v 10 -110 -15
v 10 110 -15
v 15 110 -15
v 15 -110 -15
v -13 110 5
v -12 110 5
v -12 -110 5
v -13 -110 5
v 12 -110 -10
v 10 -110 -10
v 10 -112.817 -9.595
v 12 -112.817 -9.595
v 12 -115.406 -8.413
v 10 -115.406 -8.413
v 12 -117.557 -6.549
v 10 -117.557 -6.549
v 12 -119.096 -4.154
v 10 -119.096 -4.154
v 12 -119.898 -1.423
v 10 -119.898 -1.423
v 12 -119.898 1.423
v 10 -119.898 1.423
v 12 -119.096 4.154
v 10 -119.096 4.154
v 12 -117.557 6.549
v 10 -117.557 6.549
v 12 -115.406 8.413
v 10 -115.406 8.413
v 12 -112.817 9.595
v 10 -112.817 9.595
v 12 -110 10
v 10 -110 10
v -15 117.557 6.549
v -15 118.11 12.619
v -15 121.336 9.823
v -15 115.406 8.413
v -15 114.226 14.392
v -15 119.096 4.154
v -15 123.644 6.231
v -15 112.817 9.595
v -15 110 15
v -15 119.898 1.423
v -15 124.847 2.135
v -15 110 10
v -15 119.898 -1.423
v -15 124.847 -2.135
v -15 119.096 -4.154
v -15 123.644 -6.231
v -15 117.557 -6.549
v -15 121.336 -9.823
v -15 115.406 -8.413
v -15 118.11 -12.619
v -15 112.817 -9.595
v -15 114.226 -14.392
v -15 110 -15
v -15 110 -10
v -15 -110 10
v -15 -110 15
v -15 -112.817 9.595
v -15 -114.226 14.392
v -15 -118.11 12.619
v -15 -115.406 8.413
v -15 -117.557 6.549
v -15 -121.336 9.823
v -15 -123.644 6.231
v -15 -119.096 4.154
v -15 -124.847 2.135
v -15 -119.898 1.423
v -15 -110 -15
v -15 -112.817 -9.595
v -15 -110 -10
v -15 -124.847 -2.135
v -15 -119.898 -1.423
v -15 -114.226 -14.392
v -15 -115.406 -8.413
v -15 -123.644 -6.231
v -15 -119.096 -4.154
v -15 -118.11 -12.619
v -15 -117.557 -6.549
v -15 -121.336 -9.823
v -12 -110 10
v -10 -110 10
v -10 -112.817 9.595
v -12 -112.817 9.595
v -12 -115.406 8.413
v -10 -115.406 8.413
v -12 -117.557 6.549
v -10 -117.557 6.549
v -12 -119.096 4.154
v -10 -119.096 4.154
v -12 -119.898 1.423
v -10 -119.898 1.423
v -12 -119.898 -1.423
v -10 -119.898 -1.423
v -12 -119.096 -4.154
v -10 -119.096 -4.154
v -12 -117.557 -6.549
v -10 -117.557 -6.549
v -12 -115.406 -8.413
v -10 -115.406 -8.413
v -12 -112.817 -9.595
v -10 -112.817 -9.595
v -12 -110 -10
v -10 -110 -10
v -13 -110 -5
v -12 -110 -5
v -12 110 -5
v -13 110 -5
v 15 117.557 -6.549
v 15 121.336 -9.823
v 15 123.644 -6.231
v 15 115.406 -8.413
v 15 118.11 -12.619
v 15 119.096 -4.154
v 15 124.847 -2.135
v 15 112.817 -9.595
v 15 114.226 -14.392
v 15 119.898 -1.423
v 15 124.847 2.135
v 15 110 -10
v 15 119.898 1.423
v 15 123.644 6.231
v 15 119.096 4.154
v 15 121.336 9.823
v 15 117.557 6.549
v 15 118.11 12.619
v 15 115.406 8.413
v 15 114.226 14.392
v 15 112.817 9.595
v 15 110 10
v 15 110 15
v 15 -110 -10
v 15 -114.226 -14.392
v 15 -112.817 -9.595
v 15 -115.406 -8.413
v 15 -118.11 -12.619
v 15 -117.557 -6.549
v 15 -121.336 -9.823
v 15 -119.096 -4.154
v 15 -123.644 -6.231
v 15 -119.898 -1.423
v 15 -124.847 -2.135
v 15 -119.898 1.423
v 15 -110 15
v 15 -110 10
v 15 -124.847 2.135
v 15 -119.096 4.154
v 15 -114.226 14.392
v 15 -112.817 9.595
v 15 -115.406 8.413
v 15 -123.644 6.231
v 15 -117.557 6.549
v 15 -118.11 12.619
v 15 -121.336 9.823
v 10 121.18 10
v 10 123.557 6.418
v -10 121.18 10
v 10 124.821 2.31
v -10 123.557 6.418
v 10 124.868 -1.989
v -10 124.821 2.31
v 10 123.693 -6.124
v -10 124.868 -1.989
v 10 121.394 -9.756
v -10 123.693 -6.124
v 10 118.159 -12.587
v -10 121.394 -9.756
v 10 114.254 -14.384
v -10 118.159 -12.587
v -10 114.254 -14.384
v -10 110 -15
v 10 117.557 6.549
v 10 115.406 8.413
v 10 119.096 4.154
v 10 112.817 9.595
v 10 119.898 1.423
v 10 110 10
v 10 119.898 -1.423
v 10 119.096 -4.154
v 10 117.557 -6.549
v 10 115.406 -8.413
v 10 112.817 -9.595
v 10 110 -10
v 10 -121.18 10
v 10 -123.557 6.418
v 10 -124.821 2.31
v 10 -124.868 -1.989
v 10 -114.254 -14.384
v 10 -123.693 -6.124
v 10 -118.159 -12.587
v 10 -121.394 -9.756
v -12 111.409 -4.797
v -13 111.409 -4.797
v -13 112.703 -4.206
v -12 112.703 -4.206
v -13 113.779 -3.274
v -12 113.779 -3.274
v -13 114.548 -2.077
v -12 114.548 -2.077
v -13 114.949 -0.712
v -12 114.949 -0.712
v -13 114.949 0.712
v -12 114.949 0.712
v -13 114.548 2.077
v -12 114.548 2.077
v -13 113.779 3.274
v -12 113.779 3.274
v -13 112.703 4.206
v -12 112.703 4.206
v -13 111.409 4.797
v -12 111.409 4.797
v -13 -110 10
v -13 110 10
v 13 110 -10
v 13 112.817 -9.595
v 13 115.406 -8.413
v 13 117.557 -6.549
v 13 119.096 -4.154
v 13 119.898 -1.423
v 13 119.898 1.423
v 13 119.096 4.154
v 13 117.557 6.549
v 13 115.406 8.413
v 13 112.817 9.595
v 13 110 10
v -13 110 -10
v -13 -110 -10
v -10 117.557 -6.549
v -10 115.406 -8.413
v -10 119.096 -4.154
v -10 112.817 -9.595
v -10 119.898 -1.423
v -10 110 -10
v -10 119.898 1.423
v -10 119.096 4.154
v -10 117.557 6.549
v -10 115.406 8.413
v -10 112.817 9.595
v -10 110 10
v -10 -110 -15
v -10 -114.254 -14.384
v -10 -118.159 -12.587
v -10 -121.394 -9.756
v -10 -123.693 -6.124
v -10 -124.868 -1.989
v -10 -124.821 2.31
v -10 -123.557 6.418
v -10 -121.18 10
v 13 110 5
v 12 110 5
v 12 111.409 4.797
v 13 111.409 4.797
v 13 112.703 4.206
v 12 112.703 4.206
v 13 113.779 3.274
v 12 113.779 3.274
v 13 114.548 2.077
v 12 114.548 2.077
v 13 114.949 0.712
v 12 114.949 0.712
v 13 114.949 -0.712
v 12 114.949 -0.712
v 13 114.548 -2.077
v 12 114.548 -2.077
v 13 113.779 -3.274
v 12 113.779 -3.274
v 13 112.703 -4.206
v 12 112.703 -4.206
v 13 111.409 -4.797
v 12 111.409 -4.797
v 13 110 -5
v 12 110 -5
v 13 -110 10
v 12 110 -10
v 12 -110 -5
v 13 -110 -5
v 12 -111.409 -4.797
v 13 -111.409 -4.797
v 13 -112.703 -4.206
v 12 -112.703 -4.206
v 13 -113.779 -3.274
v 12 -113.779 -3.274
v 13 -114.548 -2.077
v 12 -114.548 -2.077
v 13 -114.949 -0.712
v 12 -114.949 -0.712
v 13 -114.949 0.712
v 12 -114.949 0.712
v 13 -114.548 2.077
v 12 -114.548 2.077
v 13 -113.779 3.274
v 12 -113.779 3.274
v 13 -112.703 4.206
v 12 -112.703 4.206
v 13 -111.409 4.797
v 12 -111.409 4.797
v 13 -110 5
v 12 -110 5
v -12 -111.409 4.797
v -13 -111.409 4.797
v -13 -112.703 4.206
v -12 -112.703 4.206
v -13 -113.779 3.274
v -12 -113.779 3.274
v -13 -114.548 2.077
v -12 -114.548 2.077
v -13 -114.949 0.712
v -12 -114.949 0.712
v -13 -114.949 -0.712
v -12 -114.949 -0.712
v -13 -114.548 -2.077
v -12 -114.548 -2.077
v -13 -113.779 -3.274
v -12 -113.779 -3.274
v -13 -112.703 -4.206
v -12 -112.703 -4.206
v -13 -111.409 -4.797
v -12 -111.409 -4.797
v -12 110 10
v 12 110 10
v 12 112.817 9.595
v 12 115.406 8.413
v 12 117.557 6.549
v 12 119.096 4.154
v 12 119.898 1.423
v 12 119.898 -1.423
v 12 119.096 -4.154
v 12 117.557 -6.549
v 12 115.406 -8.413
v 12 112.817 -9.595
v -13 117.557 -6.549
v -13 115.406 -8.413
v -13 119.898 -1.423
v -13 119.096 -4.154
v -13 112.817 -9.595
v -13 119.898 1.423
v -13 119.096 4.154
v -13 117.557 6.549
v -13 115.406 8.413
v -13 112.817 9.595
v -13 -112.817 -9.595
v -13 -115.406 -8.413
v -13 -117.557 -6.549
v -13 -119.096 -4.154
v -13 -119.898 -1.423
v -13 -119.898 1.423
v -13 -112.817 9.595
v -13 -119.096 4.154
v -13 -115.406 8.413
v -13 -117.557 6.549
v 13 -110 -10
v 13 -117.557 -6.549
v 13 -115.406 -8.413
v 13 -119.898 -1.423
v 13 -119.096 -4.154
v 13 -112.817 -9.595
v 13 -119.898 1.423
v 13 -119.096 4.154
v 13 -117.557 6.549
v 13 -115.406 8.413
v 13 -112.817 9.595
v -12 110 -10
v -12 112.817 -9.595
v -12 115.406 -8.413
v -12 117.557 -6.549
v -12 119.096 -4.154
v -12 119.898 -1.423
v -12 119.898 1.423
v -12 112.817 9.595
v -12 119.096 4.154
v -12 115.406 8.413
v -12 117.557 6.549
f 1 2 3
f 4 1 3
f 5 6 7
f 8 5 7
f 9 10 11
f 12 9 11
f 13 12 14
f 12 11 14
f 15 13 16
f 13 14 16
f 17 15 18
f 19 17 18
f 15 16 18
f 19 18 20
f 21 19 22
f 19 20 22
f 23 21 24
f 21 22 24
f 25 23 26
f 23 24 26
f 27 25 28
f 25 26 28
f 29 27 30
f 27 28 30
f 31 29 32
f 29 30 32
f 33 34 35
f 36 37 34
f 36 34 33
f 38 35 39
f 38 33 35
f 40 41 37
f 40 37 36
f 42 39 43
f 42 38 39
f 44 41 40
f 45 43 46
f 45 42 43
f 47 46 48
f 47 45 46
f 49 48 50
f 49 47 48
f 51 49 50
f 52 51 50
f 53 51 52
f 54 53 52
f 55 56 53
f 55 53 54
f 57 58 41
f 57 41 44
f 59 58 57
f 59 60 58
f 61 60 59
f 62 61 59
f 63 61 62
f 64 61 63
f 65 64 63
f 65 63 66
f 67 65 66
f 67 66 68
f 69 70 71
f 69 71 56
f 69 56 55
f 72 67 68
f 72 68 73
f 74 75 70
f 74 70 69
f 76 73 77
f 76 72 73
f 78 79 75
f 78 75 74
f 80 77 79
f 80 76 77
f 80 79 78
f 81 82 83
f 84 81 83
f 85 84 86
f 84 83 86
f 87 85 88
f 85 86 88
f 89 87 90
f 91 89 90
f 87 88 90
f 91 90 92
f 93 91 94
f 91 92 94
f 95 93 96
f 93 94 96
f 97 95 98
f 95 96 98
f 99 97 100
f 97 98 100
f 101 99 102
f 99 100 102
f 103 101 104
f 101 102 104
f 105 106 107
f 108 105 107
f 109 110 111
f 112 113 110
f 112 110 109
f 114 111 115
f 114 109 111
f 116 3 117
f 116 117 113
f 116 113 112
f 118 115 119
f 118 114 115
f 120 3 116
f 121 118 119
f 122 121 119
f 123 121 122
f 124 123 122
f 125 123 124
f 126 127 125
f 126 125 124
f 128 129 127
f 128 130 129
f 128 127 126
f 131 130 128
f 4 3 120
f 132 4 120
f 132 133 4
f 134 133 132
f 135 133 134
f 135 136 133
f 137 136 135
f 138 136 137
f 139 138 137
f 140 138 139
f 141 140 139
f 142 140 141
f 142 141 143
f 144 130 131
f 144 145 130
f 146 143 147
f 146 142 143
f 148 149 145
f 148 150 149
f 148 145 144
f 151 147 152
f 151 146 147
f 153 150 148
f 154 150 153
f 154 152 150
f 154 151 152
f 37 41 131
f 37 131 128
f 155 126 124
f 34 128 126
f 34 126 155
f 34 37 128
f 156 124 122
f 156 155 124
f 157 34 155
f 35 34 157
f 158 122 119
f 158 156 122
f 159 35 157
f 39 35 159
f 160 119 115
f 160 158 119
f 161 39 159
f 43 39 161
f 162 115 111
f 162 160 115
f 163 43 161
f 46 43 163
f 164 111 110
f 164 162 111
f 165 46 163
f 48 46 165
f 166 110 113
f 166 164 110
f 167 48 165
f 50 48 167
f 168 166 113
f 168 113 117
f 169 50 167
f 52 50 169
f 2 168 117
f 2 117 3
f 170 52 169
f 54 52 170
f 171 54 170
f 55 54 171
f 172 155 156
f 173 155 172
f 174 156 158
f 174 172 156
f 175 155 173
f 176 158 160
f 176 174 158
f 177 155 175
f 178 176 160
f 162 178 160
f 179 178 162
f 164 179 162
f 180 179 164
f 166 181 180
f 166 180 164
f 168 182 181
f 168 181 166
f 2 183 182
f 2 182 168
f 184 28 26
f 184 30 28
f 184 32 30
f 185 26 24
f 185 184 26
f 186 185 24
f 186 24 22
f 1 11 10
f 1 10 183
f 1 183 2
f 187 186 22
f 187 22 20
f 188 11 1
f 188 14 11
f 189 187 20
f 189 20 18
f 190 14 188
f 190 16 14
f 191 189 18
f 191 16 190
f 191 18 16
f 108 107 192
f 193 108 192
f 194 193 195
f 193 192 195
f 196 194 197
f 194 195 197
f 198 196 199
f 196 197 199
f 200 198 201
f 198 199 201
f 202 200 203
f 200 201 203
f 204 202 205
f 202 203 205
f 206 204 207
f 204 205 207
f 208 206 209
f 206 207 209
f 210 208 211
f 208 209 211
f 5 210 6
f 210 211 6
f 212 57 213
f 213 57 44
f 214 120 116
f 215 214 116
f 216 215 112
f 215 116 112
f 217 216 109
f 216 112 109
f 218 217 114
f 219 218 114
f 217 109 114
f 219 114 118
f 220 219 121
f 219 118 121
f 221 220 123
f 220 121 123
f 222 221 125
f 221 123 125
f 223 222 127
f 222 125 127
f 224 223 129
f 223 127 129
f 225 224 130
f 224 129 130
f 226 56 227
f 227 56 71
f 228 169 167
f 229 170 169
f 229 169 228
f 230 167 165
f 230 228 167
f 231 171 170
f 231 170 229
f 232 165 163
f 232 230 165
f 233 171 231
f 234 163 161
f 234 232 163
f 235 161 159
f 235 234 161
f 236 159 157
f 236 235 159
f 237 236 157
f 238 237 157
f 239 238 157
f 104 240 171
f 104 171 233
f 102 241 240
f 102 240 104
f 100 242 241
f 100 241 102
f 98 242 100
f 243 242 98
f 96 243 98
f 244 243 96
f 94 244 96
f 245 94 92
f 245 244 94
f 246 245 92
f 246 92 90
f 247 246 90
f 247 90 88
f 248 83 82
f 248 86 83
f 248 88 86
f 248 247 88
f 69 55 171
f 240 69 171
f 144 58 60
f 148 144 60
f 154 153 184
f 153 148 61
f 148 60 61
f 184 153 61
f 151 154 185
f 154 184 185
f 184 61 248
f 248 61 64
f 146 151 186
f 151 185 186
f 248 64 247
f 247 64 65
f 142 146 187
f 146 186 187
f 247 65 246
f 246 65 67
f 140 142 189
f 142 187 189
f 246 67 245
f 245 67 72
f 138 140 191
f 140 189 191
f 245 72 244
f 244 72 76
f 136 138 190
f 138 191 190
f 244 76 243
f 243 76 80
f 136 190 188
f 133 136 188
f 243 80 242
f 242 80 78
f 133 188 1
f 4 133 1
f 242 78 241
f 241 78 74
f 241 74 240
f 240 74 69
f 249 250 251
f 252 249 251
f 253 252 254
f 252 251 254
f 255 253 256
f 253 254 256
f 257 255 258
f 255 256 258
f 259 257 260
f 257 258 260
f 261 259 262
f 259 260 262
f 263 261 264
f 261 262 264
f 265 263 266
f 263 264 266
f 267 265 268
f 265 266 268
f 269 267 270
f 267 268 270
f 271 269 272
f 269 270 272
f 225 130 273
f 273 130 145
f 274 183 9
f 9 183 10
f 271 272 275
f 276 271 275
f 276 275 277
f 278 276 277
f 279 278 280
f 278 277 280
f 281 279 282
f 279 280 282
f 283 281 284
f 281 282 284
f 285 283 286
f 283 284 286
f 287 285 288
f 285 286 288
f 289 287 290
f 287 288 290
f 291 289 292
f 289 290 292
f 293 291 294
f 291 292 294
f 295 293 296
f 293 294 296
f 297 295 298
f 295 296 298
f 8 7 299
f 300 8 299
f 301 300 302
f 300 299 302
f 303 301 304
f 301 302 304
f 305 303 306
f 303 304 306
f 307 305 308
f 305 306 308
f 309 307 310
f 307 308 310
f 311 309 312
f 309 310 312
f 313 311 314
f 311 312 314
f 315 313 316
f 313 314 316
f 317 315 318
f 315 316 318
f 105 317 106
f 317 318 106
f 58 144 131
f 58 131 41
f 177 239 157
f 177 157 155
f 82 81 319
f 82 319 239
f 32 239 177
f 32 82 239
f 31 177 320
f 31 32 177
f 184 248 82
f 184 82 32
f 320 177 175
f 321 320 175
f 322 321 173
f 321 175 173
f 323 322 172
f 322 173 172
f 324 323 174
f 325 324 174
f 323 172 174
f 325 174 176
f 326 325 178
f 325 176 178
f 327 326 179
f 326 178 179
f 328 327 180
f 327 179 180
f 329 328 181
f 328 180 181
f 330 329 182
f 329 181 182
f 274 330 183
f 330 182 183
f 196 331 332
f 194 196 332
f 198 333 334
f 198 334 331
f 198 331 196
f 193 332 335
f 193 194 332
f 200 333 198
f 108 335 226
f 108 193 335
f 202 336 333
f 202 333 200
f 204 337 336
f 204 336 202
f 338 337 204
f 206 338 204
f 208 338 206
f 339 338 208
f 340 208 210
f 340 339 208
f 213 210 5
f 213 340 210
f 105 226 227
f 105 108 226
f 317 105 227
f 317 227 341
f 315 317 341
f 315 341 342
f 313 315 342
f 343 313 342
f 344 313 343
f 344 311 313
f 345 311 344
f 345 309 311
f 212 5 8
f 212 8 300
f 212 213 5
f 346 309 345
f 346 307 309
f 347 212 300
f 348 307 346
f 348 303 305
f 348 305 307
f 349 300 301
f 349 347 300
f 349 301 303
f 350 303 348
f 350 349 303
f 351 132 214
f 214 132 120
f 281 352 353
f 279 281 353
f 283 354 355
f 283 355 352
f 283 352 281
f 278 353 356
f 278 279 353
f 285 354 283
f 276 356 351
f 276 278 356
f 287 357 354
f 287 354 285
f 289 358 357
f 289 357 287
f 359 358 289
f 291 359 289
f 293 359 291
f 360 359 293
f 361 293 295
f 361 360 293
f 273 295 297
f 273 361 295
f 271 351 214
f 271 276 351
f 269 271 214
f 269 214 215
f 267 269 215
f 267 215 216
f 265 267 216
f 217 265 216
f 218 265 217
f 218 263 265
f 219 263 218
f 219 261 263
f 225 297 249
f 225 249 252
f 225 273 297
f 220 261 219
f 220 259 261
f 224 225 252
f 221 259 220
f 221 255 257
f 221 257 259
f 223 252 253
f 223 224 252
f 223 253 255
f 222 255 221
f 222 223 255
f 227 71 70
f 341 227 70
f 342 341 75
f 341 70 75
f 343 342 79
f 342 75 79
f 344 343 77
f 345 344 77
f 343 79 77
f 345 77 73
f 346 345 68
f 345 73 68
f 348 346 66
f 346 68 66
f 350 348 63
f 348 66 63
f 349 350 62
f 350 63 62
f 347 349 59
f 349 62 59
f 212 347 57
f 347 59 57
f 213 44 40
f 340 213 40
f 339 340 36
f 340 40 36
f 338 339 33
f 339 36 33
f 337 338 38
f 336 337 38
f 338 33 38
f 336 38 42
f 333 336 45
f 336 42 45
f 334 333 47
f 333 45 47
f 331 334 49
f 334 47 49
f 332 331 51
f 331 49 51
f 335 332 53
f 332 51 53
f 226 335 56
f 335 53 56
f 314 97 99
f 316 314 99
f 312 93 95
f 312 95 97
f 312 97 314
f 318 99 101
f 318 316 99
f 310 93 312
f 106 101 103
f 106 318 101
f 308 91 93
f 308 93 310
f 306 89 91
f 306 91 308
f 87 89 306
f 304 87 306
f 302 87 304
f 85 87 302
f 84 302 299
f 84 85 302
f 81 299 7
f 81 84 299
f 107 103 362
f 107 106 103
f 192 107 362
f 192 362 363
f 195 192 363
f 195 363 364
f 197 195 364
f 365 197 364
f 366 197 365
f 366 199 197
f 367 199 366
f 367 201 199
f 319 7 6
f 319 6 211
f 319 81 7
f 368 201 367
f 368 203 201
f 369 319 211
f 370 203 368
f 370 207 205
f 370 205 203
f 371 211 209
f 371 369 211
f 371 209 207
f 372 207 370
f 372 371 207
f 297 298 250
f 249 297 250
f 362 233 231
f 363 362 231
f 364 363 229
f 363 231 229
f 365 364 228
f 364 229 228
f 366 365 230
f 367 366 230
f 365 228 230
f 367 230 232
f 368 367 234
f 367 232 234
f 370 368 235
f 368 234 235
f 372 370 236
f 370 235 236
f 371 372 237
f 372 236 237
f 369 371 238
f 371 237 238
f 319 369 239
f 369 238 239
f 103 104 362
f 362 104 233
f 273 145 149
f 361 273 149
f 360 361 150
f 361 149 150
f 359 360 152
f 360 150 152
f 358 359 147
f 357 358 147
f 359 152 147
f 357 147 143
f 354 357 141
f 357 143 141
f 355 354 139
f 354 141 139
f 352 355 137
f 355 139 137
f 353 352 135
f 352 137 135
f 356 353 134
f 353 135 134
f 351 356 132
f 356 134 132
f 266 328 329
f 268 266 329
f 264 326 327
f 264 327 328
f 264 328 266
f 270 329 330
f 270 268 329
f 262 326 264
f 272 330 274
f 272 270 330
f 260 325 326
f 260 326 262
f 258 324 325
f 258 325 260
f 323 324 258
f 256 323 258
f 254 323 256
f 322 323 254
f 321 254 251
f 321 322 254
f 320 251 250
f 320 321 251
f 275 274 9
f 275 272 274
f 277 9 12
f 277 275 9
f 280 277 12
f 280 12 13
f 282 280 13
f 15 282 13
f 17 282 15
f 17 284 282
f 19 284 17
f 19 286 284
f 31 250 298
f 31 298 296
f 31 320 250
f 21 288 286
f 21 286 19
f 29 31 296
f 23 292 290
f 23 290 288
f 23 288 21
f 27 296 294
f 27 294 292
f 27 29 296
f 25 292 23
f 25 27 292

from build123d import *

# Parameters (mm, degrees)
F1_DEPTH      = 125
F1_DEPTH_BACK = 125
F6_DEPTH      = 5.001
F7_DEPTH      = 5.001
F8_DEPTH      = 2
F9_DEPTH      = 2
F10_DEPTH     = 2
F11_DEPTH     = 2
F12_T1_DEPTH  = 80
F12_T3_DEPTH  = 80
F12_T5_DEPTH  = 105


# Not quite as in the source:
# - a fillet or chamfer that OpenCascade refuses, or shapes differently, is made with other operations: its cross-section is extruded or revolved along the edge and cut away or added


with BuildPart() as f1:
    # F0 (on Front) → F1 (new body, two sides)
    with BuildSketch(Plane.XZ) as f1_sk:
        Polygon((15, -15), (15, 15), (-15, 15), (-15, -15), (-10, -15), (-10, 10), (10, 10), (10, -15), align=None)
    extrude(amount=F1_DEPTH)
    extrude(f1_sk.sketch, amount=-F1_DEPTH_BACK)

    # F2 (on face) → F6 (cut, through all)
    with BuildSketch(Plane(origin=(10, 0, 0), x_dir=(0, -1, 0), z_dir=(-1, 0, 0))):
        with BuildLine():
            Line((-110, -5), (110, -5))
            ThreePointArc((110, -5), (115, 0), (110, 5))
            Line((110, 5), (-110, 5))
            ThreePointArc((-110, 5), (-115, 0), (-110, -5))
        make_face()
    extrude(amount=-F6_DEPTH, mode=Mode.SUBTRACT)

    # F4 (on face) → F7 (cut, through all)
    with BuildSketch(Plane.YZ.offset(-10)):
        with BuildLine():
            Line((110, 5), (-110, 5))
            ThreePointArc((-110, 5), (-115, 0), (-110, -5))
            Line((-110, -5), (110, -5))
            ThreePointArc((110, -5), (115, 0), (110, 5))
        make_face()
    extrude(amount=-F7_DEPTH, mode=Mode.SUBTRACT)

    # F2 (on face) → F8 (cut)
    with BuildSketch(Plane(origin=(10, 0, 0), x_dir=(0, -1, 0), z_dir=(-1, 0, 0))):
        with BuildLine():
            Line((-110, -10), (110, -10))
            ThreePointArc((110, -10), (120, 0), (110, 10))
            Line((110, 10), (-110, 10))
            ThreePointArc((-110, 10), (-120, 0), (-110, -10))
        make_face()
        with BuildLine():
            ThreePointArc((110, 5), (115, 0), (110, -5))
            Line((110, -5), (-110, -5))
            ThreePointArc((-110, -5), (-115, 0), (-110, 5))
            Line((-110, 5), (110, 5))
        make_face(mode=Mode.SUBTRACT)
    extrude(amount=-F8_DEPTH, mode=Mode.SUBTRACT)

    # F3 (on face) → F9 (cut)
    with BuildSketch(Plane.YZ.offset(15)):
        with BuildLine():
            ThreePointArc((-110, 10), (-120, 0), (-110, -10))
            Line((-110, -10), (110, -10))
            ThreePointArc((110, -10), (120, 0), (110, 10))
            Line((110, 10), (-110, 10))
        make_face()
        with BuildLine():
            ThreePointArc((-110, -5), (-115, 0), (-110, 5))
            Line((-110, 5), (110, 5))
            ThreePointArc((110, 5), (115, 0), (110, -5))
            Line((110, -5), (-110, -5))
        make_face(mode=Mode.SUBTRACT)
    extrude(amount=-F9_DEPTH, mode=Mode.SUBTRACT)

    # F5 (on face) → F10 (cut)
    with BuildSketch(Plane(origin=(-15, 0, 0), x_dir=(0, -1, 0), z_dir=(-1, 0, 0))):
        with BuildLine():
            Line((110, 10), (-110, 10))
            ThreePointArc((-110, 10), (-120, 0), (-110, -10))
            Line((-110, -10), (110, -10))
            ThreePointArc((110, -10), (120, 0), (110, 10))
        make_face()
        with BuildLine():
            ThreePointArc((-110, -5), (-115, 0), (-110, 5))
            Line((-110, 5), (110, 5))
            ThreePointArc((110, 5), (115, 0), (110, -5))
            Line((110, -5), (-110, -5))
        make_face(mode=Mode.SUBTRACT)
    extrude(amount=-F10_DEPTH, mode=Mode.SUBTRACT)

    # F4 (on face) → F11 (cut)
    with BuildSketch(Plane.YZ.offset(-10)):
        with BuildLine():
            Line((110, 10), (-110, 10))
            ThreePointArc((-110, 10), (-120, 0), (-110, -10))
            Line((-110, -10), (110, -10))
            ThreePointArc((110, -10), (120, 0), (110, 10))
        make_face()
        with BuildLine():
            ThreePointArc((-110, -5), (-115, 0), (-110, 5))
            Line((-110, 5), (110, 5))
            ThreePointArc((110, 5), (115, 0), (110, -5))
            Line((110, -5), (-110, -5))
        make_face(mode=Mode.SUBTRACT)
    extrude(amount=-F11_DEPTH, mode=Mode.SUBTRACT)

    # F12: fillet of radius 15 on 6 edges, made by hand

    # F12_s2 → F12_t1 (cut)
    with BuildSketch(Plane.YZ.offset(-52.5)):
        with BuildLine():
            ThreePointArc((125, 0), (120.6066017178, -10.6066017178), (110, -15))
            Line((110, -15), (125, -15))
            Line((125, -15), (125, 0))
        make_face()
        with BuildLine():
            ThreePointArc((-125, 0), (-120.6066017178, -10.6066017178), (-110, -15))
            Line((-110, -15), (-125, -15))
            Line((-125, -15), (-125, 0))
        make_face()
    extrude(amount=F12_T1_DEPTH, mode=Mode.SUBTRACT)

    # F12_s4 → F12_t3 (cut)
    with BuildSketch(Plane.YZ.offset(-27.5)):
        with BuildLine():
            ThreePointArc((110, -15), (120.6066017178, -10.6066017178), (125, 0))
            Line((125, 0), (125, -15))
            Line((125, -15), (110, -15))
        make_face()
        with BuildLine():
            ThreePointArc((-110, -15), (-120.6066017178, -10.6066017178), (-125, 0))
            Line((-125, 0), (-125, -15))
            Line((-125, -15), (-110, -15))
        make_face()
    extrude(amount=F12_T3_DEPTH, mode=Mode.SUBTRACT)

    # F12_s6 → F12_t5 (cut)
    with BuildSketch(Plane.YZ.offset(-52.5)):
        with BuildLine():
            ThreePointArc((125, 0), (120.6066017178, 10.6066017178), (110, 15))
            Line((110, 15), (125, 15))
            Line((125, 15), (125, 0))
        make_face()
        with BuildLine():
            ThreePointArc((-125, 0), (-120.6066017178, 10.6066017178), (-110, 15))
            Line((-110, 15), (-125, 15))
            Line((-125, 15), (-125, 0))
        make_face()
    extrude(amount=F12_T5_DEPTH, mode=Mode.SUBTRACT)


solid = f1.part
